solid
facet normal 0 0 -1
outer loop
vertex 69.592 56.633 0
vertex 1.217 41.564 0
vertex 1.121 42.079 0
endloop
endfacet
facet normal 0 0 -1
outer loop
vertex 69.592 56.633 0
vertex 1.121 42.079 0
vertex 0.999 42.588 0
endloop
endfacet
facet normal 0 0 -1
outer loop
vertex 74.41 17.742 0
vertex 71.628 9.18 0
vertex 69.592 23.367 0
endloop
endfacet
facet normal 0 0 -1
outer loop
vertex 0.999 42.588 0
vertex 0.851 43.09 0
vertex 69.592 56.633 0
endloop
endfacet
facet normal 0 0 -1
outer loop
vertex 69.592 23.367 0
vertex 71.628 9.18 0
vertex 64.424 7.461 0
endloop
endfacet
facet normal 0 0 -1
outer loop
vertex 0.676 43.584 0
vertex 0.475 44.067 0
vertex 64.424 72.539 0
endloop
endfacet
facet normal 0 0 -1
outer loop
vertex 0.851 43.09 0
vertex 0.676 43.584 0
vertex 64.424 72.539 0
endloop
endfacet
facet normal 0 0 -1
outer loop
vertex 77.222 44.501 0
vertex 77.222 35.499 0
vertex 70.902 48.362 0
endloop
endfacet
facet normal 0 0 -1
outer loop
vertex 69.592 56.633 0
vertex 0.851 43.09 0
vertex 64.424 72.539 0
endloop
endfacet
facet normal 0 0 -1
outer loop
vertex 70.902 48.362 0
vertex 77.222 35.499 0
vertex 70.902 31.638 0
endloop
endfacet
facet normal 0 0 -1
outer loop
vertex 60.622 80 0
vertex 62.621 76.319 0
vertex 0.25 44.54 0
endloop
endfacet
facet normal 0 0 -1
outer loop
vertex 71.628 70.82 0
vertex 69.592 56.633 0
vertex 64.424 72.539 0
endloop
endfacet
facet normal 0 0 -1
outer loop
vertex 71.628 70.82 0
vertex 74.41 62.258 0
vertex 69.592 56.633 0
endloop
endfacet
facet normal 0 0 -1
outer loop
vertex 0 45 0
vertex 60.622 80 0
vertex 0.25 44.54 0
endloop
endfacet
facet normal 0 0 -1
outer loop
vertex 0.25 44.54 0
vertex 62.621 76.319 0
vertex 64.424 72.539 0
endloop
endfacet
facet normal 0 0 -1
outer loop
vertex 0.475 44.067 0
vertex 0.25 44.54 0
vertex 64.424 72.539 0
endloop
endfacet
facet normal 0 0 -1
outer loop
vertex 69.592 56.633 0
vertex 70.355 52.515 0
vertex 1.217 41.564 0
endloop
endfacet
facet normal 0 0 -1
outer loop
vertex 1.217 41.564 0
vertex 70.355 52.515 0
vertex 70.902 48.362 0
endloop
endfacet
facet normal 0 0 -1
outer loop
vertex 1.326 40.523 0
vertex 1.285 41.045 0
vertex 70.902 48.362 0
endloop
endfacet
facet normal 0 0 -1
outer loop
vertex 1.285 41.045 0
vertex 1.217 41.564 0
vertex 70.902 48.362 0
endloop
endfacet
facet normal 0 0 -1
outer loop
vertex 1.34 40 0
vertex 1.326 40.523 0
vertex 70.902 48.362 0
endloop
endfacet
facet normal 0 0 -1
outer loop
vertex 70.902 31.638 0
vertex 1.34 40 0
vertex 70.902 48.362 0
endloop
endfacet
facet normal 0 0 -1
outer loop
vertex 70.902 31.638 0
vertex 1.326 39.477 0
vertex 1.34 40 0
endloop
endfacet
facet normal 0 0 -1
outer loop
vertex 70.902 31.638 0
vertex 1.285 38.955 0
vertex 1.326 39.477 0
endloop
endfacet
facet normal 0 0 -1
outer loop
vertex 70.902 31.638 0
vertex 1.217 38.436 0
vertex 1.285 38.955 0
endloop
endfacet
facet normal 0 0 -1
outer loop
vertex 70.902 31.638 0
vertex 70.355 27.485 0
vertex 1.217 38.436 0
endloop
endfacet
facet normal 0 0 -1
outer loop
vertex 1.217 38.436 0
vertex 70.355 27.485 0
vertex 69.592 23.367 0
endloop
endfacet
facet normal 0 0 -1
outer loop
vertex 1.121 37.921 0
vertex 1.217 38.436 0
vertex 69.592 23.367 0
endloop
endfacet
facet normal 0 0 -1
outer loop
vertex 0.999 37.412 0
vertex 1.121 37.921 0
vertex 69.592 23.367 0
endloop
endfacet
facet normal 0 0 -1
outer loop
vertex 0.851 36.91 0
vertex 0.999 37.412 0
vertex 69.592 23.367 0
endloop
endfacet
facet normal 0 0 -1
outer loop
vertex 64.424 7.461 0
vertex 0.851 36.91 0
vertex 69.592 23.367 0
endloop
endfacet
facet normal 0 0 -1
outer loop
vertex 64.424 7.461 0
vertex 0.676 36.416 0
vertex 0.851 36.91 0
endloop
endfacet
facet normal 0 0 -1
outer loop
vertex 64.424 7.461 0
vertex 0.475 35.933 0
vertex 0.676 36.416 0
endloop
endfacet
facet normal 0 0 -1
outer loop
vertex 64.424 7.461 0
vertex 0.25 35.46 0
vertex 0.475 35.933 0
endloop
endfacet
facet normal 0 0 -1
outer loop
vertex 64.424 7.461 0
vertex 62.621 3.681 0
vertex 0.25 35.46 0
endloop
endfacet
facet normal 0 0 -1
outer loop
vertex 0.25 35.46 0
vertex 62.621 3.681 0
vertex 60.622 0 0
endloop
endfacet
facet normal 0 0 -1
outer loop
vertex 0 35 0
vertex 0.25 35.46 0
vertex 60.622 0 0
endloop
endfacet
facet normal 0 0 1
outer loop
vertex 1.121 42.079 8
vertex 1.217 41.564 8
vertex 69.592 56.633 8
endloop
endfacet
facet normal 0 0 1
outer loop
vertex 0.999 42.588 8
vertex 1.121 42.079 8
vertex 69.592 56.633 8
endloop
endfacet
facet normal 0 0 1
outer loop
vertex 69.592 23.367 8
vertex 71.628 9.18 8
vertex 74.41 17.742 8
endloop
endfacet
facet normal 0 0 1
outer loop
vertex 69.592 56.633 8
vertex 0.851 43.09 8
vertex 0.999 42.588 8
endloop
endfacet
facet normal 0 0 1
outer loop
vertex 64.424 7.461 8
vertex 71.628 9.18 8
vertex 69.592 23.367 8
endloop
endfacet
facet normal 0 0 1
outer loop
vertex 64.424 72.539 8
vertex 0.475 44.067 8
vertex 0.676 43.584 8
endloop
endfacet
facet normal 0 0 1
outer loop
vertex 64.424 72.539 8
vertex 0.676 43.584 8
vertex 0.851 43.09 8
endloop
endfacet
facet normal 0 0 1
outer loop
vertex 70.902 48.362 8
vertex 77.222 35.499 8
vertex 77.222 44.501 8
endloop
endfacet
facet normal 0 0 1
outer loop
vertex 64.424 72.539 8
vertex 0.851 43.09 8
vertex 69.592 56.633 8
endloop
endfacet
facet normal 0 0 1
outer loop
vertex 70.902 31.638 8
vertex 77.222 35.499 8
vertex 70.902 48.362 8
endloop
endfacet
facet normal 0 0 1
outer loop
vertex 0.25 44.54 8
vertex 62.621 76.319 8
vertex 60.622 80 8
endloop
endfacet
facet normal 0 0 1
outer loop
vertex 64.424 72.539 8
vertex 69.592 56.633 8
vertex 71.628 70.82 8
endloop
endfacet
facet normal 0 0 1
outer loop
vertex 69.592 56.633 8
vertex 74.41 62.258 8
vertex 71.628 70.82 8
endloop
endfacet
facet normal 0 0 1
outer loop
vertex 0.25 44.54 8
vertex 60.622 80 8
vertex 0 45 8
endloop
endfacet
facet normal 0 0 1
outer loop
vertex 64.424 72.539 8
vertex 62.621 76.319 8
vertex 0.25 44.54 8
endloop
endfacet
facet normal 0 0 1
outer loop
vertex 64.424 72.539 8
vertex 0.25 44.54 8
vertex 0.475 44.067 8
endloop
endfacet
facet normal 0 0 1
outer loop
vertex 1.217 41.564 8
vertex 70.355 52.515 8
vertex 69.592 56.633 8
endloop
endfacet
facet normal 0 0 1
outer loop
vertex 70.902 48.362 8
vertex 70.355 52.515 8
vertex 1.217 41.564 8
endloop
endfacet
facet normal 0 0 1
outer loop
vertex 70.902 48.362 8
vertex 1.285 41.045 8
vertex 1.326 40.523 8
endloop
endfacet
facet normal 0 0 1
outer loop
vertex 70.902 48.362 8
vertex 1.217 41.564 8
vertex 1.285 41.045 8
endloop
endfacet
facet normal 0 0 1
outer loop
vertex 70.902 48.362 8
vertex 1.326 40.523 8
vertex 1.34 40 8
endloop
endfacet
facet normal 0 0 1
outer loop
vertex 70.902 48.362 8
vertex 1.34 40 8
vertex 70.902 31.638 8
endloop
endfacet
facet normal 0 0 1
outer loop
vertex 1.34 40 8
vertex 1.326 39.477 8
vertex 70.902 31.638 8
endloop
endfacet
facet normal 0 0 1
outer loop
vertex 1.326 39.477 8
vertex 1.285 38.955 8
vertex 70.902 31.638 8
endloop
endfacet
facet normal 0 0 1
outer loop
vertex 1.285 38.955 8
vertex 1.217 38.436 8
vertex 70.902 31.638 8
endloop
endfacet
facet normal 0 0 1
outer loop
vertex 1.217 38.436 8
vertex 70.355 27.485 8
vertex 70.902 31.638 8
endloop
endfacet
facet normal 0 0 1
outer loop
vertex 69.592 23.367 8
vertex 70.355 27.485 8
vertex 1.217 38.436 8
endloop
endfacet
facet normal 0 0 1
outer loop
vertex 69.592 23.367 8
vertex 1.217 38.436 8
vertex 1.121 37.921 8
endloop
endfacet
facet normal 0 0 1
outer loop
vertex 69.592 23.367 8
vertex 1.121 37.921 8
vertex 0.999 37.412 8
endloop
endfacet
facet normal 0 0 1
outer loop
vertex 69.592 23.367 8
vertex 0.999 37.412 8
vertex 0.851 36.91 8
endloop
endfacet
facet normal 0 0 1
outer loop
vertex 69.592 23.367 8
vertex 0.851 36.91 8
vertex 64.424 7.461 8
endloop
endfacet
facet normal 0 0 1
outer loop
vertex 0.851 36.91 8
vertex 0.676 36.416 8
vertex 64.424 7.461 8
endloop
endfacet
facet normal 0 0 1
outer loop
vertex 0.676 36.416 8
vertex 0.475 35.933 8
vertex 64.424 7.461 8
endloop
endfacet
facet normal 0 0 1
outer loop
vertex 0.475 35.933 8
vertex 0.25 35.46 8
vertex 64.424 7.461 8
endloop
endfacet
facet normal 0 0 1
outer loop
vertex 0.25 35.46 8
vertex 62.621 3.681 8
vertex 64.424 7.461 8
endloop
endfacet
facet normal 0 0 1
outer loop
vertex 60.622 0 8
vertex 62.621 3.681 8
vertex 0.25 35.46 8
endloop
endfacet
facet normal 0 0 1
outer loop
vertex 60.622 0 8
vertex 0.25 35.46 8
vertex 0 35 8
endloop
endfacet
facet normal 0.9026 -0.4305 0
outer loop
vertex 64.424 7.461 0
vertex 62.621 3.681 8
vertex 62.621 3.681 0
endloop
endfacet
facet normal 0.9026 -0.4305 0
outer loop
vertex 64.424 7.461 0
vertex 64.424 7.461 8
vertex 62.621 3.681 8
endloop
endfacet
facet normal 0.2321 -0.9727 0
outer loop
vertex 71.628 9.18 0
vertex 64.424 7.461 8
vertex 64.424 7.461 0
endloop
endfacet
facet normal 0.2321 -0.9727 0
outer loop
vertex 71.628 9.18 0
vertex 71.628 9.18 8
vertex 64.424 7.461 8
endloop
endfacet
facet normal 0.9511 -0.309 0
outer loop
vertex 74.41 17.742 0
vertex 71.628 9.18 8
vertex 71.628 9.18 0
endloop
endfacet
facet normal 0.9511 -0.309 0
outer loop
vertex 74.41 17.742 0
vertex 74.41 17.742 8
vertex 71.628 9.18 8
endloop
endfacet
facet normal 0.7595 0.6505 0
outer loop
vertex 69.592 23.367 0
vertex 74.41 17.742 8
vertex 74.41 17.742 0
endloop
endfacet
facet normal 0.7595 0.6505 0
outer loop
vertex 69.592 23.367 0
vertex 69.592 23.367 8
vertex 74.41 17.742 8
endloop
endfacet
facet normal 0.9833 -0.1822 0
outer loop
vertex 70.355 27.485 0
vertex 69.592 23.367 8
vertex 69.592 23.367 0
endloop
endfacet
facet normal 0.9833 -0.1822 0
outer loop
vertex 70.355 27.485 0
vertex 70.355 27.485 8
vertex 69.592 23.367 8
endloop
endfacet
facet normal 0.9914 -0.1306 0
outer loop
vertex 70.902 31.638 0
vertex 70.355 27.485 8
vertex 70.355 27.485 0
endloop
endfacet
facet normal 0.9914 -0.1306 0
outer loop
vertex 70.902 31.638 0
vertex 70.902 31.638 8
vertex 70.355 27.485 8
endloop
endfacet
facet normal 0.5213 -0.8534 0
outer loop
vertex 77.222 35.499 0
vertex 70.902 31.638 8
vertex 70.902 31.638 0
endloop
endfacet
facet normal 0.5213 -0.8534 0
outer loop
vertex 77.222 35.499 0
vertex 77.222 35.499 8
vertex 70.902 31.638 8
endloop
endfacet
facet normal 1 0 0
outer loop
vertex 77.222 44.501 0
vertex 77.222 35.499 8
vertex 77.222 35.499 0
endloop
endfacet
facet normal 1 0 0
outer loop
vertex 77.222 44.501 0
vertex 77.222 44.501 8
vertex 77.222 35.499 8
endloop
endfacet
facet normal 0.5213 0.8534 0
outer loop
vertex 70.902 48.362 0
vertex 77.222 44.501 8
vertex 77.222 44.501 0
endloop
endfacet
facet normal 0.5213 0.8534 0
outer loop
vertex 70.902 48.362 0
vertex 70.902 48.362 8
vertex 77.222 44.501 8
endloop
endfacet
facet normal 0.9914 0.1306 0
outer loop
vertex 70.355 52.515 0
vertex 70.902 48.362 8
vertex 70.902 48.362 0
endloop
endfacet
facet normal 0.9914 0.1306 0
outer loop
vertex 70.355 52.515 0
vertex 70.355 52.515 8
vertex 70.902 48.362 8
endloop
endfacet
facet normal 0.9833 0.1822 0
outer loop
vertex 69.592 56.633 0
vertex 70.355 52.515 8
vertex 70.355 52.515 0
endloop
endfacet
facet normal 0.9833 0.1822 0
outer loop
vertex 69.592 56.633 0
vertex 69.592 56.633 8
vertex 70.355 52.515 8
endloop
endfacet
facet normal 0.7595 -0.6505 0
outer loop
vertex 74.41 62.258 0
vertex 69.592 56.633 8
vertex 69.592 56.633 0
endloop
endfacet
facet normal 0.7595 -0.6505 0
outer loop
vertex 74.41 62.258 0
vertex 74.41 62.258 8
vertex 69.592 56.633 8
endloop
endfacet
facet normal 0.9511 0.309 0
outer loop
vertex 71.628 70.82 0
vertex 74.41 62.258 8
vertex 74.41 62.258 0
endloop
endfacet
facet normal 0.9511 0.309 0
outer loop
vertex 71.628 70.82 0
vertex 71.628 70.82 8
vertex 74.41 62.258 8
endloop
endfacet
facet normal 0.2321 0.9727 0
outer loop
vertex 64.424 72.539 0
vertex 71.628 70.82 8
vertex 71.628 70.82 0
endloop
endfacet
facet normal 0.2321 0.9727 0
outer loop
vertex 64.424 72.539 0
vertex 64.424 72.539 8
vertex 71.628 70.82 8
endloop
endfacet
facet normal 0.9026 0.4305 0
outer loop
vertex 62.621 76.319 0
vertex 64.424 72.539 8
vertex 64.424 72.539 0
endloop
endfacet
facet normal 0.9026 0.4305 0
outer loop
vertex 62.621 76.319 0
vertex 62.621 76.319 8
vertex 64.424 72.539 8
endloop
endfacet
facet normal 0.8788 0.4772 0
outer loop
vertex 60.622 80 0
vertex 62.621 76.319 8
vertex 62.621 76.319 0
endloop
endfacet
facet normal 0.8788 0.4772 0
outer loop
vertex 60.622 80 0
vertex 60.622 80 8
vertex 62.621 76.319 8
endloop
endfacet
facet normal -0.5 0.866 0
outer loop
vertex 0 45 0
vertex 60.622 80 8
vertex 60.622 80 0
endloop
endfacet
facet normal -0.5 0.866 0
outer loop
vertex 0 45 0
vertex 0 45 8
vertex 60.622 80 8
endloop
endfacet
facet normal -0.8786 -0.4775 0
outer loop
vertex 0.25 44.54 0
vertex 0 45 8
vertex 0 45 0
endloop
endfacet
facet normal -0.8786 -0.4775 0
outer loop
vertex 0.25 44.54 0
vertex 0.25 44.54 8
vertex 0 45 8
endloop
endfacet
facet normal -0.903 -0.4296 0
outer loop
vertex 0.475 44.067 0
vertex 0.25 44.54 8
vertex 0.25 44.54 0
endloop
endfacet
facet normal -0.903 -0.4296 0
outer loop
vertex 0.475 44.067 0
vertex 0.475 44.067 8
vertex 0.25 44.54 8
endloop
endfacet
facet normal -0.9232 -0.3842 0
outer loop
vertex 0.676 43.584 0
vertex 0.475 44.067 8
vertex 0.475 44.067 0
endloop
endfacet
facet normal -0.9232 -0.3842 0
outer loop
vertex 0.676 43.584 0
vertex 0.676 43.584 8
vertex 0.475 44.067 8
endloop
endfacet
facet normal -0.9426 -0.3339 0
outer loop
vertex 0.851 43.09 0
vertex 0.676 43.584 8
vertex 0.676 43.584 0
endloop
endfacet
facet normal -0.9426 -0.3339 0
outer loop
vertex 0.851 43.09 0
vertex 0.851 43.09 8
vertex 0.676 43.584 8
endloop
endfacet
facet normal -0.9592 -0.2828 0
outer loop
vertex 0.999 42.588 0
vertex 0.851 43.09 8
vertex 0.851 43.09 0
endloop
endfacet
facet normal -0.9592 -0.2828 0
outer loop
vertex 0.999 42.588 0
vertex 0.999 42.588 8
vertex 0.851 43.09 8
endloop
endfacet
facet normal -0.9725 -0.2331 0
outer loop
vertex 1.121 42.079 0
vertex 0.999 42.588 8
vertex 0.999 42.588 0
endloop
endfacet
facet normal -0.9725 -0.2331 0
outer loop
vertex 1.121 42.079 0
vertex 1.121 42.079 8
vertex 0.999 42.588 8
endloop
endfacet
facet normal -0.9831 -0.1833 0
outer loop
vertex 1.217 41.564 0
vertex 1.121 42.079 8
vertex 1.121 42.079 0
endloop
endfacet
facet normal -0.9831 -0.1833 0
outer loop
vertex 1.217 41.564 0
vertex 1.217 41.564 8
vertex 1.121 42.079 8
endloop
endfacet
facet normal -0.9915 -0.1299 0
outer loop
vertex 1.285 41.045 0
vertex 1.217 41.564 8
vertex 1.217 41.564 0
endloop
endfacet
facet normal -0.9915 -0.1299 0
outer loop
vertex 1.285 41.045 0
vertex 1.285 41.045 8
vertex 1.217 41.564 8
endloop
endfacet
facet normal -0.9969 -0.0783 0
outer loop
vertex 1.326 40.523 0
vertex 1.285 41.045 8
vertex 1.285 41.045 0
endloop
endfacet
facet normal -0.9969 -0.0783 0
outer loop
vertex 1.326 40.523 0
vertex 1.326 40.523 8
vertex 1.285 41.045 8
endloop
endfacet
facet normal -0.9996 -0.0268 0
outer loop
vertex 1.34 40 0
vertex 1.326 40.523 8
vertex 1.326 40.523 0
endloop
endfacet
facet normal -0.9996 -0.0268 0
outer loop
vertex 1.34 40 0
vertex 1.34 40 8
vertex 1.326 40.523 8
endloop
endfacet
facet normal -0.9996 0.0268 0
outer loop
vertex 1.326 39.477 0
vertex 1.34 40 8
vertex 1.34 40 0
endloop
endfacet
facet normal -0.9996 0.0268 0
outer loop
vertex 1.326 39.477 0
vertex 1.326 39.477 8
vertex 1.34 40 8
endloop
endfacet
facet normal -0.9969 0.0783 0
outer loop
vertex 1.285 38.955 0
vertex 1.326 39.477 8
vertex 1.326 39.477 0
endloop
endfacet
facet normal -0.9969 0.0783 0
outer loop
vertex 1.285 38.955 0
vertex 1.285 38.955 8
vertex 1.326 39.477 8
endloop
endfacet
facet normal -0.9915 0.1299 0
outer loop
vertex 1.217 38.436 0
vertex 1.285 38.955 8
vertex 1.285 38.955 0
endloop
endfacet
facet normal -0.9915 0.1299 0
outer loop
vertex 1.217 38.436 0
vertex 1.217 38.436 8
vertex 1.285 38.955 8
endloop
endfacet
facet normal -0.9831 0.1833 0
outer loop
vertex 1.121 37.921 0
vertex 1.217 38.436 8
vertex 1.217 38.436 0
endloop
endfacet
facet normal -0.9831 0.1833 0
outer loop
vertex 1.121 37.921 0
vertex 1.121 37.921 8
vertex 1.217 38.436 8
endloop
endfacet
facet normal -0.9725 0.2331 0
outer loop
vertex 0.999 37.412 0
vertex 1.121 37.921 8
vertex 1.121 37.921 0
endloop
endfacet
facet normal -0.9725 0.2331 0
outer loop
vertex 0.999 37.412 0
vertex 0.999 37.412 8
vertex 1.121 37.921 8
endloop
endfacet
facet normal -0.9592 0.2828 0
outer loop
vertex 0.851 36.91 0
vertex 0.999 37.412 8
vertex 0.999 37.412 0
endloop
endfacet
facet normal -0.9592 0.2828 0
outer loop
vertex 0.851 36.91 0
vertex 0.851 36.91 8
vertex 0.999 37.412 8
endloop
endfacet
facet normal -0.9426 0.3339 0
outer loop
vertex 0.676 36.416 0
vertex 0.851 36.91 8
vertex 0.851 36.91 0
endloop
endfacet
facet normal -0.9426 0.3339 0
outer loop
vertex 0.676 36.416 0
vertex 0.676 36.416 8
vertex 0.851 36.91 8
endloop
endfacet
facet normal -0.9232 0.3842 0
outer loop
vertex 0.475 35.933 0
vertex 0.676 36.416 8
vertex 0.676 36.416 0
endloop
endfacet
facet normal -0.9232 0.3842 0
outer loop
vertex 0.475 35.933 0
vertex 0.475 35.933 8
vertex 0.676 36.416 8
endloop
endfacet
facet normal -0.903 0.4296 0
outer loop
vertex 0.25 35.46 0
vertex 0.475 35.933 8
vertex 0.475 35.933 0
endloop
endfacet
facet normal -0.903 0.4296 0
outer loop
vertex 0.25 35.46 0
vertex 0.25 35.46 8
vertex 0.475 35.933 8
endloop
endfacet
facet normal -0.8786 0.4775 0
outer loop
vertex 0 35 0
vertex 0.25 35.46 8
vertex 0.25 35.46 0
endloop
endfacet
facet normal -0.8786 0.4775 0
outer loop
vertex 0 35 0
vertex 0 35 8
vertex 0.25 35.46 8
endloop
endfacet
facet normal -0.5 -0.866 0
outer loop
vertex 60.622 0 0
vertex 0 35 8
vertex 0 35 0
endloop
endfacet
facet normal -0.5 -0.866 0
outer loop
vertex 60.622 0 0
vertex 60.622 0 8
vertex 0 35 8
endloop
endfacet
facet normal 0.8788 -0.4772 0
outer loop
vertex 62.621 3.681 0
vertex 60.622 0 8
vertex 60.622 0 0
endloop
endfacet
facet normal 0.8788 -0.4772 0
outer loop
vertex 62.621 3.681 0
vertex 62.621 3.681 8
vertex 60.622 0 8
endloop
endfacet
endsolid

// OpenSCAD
$fn = 32;

// ----------------------------------------------------------------------
// Gear sector: 3 teeth on 60 degrees
// ----------------------------------------------------------------------

// --- parameters (mm) ---
sector_angle = 60;        // sector angle, degrees
root_r = 80;              // root circle radius
tooth_h = 6;              // tooth height over the root circle
teeth = 3;                // number of teeth on the sector
hub_r = 10;               // hub bore radius
plate_t = 8;              // sector thickness, Z
arc_step = 3;             // sampling step of the root/hub arcs, degrees

tip_r = root_r + tooth_h;  // tip circle radius

profile = [[60.622, 0], [62.621, 3.681], [64.424, 7.461], [71.628, 9.18], [74.41, 17.742], [69.592, 23.367], [70.355, 27.485], [70.902, 31.638], [77.222, 35.499], [77.222, 44.501], [70.902, 48.362], [70.355, 52.515], [69.592, 56.633], [74.41, 62.258], [71.628, 70.82], [64.424, 72.539], [62.621, 76.319], [60.622, 80], [0, 45], [0.25, 44.54], [0.475, 44.067], [0.676, 43.584], [0.851, 43.09], [0.999, 42.588], [1.121, 42.079], [1.217, 41.564], [1.285, 41.045], [1.326, 40.523], [1.34, 40], [1.326, 39.477], [1.285, 38.955], [1.217, 38.436], [1.121, 37.921], [0.999, 37.412], [0.851, 36.91], [0.676, 36.416], [0.475, 35.933], [0.25, 35.46], [0, 35]];  // primary outline, 39 points, counter clockwise

// --- the one profile operation ---
linear_extrude(height = plate_t) polygon(points = profile);
